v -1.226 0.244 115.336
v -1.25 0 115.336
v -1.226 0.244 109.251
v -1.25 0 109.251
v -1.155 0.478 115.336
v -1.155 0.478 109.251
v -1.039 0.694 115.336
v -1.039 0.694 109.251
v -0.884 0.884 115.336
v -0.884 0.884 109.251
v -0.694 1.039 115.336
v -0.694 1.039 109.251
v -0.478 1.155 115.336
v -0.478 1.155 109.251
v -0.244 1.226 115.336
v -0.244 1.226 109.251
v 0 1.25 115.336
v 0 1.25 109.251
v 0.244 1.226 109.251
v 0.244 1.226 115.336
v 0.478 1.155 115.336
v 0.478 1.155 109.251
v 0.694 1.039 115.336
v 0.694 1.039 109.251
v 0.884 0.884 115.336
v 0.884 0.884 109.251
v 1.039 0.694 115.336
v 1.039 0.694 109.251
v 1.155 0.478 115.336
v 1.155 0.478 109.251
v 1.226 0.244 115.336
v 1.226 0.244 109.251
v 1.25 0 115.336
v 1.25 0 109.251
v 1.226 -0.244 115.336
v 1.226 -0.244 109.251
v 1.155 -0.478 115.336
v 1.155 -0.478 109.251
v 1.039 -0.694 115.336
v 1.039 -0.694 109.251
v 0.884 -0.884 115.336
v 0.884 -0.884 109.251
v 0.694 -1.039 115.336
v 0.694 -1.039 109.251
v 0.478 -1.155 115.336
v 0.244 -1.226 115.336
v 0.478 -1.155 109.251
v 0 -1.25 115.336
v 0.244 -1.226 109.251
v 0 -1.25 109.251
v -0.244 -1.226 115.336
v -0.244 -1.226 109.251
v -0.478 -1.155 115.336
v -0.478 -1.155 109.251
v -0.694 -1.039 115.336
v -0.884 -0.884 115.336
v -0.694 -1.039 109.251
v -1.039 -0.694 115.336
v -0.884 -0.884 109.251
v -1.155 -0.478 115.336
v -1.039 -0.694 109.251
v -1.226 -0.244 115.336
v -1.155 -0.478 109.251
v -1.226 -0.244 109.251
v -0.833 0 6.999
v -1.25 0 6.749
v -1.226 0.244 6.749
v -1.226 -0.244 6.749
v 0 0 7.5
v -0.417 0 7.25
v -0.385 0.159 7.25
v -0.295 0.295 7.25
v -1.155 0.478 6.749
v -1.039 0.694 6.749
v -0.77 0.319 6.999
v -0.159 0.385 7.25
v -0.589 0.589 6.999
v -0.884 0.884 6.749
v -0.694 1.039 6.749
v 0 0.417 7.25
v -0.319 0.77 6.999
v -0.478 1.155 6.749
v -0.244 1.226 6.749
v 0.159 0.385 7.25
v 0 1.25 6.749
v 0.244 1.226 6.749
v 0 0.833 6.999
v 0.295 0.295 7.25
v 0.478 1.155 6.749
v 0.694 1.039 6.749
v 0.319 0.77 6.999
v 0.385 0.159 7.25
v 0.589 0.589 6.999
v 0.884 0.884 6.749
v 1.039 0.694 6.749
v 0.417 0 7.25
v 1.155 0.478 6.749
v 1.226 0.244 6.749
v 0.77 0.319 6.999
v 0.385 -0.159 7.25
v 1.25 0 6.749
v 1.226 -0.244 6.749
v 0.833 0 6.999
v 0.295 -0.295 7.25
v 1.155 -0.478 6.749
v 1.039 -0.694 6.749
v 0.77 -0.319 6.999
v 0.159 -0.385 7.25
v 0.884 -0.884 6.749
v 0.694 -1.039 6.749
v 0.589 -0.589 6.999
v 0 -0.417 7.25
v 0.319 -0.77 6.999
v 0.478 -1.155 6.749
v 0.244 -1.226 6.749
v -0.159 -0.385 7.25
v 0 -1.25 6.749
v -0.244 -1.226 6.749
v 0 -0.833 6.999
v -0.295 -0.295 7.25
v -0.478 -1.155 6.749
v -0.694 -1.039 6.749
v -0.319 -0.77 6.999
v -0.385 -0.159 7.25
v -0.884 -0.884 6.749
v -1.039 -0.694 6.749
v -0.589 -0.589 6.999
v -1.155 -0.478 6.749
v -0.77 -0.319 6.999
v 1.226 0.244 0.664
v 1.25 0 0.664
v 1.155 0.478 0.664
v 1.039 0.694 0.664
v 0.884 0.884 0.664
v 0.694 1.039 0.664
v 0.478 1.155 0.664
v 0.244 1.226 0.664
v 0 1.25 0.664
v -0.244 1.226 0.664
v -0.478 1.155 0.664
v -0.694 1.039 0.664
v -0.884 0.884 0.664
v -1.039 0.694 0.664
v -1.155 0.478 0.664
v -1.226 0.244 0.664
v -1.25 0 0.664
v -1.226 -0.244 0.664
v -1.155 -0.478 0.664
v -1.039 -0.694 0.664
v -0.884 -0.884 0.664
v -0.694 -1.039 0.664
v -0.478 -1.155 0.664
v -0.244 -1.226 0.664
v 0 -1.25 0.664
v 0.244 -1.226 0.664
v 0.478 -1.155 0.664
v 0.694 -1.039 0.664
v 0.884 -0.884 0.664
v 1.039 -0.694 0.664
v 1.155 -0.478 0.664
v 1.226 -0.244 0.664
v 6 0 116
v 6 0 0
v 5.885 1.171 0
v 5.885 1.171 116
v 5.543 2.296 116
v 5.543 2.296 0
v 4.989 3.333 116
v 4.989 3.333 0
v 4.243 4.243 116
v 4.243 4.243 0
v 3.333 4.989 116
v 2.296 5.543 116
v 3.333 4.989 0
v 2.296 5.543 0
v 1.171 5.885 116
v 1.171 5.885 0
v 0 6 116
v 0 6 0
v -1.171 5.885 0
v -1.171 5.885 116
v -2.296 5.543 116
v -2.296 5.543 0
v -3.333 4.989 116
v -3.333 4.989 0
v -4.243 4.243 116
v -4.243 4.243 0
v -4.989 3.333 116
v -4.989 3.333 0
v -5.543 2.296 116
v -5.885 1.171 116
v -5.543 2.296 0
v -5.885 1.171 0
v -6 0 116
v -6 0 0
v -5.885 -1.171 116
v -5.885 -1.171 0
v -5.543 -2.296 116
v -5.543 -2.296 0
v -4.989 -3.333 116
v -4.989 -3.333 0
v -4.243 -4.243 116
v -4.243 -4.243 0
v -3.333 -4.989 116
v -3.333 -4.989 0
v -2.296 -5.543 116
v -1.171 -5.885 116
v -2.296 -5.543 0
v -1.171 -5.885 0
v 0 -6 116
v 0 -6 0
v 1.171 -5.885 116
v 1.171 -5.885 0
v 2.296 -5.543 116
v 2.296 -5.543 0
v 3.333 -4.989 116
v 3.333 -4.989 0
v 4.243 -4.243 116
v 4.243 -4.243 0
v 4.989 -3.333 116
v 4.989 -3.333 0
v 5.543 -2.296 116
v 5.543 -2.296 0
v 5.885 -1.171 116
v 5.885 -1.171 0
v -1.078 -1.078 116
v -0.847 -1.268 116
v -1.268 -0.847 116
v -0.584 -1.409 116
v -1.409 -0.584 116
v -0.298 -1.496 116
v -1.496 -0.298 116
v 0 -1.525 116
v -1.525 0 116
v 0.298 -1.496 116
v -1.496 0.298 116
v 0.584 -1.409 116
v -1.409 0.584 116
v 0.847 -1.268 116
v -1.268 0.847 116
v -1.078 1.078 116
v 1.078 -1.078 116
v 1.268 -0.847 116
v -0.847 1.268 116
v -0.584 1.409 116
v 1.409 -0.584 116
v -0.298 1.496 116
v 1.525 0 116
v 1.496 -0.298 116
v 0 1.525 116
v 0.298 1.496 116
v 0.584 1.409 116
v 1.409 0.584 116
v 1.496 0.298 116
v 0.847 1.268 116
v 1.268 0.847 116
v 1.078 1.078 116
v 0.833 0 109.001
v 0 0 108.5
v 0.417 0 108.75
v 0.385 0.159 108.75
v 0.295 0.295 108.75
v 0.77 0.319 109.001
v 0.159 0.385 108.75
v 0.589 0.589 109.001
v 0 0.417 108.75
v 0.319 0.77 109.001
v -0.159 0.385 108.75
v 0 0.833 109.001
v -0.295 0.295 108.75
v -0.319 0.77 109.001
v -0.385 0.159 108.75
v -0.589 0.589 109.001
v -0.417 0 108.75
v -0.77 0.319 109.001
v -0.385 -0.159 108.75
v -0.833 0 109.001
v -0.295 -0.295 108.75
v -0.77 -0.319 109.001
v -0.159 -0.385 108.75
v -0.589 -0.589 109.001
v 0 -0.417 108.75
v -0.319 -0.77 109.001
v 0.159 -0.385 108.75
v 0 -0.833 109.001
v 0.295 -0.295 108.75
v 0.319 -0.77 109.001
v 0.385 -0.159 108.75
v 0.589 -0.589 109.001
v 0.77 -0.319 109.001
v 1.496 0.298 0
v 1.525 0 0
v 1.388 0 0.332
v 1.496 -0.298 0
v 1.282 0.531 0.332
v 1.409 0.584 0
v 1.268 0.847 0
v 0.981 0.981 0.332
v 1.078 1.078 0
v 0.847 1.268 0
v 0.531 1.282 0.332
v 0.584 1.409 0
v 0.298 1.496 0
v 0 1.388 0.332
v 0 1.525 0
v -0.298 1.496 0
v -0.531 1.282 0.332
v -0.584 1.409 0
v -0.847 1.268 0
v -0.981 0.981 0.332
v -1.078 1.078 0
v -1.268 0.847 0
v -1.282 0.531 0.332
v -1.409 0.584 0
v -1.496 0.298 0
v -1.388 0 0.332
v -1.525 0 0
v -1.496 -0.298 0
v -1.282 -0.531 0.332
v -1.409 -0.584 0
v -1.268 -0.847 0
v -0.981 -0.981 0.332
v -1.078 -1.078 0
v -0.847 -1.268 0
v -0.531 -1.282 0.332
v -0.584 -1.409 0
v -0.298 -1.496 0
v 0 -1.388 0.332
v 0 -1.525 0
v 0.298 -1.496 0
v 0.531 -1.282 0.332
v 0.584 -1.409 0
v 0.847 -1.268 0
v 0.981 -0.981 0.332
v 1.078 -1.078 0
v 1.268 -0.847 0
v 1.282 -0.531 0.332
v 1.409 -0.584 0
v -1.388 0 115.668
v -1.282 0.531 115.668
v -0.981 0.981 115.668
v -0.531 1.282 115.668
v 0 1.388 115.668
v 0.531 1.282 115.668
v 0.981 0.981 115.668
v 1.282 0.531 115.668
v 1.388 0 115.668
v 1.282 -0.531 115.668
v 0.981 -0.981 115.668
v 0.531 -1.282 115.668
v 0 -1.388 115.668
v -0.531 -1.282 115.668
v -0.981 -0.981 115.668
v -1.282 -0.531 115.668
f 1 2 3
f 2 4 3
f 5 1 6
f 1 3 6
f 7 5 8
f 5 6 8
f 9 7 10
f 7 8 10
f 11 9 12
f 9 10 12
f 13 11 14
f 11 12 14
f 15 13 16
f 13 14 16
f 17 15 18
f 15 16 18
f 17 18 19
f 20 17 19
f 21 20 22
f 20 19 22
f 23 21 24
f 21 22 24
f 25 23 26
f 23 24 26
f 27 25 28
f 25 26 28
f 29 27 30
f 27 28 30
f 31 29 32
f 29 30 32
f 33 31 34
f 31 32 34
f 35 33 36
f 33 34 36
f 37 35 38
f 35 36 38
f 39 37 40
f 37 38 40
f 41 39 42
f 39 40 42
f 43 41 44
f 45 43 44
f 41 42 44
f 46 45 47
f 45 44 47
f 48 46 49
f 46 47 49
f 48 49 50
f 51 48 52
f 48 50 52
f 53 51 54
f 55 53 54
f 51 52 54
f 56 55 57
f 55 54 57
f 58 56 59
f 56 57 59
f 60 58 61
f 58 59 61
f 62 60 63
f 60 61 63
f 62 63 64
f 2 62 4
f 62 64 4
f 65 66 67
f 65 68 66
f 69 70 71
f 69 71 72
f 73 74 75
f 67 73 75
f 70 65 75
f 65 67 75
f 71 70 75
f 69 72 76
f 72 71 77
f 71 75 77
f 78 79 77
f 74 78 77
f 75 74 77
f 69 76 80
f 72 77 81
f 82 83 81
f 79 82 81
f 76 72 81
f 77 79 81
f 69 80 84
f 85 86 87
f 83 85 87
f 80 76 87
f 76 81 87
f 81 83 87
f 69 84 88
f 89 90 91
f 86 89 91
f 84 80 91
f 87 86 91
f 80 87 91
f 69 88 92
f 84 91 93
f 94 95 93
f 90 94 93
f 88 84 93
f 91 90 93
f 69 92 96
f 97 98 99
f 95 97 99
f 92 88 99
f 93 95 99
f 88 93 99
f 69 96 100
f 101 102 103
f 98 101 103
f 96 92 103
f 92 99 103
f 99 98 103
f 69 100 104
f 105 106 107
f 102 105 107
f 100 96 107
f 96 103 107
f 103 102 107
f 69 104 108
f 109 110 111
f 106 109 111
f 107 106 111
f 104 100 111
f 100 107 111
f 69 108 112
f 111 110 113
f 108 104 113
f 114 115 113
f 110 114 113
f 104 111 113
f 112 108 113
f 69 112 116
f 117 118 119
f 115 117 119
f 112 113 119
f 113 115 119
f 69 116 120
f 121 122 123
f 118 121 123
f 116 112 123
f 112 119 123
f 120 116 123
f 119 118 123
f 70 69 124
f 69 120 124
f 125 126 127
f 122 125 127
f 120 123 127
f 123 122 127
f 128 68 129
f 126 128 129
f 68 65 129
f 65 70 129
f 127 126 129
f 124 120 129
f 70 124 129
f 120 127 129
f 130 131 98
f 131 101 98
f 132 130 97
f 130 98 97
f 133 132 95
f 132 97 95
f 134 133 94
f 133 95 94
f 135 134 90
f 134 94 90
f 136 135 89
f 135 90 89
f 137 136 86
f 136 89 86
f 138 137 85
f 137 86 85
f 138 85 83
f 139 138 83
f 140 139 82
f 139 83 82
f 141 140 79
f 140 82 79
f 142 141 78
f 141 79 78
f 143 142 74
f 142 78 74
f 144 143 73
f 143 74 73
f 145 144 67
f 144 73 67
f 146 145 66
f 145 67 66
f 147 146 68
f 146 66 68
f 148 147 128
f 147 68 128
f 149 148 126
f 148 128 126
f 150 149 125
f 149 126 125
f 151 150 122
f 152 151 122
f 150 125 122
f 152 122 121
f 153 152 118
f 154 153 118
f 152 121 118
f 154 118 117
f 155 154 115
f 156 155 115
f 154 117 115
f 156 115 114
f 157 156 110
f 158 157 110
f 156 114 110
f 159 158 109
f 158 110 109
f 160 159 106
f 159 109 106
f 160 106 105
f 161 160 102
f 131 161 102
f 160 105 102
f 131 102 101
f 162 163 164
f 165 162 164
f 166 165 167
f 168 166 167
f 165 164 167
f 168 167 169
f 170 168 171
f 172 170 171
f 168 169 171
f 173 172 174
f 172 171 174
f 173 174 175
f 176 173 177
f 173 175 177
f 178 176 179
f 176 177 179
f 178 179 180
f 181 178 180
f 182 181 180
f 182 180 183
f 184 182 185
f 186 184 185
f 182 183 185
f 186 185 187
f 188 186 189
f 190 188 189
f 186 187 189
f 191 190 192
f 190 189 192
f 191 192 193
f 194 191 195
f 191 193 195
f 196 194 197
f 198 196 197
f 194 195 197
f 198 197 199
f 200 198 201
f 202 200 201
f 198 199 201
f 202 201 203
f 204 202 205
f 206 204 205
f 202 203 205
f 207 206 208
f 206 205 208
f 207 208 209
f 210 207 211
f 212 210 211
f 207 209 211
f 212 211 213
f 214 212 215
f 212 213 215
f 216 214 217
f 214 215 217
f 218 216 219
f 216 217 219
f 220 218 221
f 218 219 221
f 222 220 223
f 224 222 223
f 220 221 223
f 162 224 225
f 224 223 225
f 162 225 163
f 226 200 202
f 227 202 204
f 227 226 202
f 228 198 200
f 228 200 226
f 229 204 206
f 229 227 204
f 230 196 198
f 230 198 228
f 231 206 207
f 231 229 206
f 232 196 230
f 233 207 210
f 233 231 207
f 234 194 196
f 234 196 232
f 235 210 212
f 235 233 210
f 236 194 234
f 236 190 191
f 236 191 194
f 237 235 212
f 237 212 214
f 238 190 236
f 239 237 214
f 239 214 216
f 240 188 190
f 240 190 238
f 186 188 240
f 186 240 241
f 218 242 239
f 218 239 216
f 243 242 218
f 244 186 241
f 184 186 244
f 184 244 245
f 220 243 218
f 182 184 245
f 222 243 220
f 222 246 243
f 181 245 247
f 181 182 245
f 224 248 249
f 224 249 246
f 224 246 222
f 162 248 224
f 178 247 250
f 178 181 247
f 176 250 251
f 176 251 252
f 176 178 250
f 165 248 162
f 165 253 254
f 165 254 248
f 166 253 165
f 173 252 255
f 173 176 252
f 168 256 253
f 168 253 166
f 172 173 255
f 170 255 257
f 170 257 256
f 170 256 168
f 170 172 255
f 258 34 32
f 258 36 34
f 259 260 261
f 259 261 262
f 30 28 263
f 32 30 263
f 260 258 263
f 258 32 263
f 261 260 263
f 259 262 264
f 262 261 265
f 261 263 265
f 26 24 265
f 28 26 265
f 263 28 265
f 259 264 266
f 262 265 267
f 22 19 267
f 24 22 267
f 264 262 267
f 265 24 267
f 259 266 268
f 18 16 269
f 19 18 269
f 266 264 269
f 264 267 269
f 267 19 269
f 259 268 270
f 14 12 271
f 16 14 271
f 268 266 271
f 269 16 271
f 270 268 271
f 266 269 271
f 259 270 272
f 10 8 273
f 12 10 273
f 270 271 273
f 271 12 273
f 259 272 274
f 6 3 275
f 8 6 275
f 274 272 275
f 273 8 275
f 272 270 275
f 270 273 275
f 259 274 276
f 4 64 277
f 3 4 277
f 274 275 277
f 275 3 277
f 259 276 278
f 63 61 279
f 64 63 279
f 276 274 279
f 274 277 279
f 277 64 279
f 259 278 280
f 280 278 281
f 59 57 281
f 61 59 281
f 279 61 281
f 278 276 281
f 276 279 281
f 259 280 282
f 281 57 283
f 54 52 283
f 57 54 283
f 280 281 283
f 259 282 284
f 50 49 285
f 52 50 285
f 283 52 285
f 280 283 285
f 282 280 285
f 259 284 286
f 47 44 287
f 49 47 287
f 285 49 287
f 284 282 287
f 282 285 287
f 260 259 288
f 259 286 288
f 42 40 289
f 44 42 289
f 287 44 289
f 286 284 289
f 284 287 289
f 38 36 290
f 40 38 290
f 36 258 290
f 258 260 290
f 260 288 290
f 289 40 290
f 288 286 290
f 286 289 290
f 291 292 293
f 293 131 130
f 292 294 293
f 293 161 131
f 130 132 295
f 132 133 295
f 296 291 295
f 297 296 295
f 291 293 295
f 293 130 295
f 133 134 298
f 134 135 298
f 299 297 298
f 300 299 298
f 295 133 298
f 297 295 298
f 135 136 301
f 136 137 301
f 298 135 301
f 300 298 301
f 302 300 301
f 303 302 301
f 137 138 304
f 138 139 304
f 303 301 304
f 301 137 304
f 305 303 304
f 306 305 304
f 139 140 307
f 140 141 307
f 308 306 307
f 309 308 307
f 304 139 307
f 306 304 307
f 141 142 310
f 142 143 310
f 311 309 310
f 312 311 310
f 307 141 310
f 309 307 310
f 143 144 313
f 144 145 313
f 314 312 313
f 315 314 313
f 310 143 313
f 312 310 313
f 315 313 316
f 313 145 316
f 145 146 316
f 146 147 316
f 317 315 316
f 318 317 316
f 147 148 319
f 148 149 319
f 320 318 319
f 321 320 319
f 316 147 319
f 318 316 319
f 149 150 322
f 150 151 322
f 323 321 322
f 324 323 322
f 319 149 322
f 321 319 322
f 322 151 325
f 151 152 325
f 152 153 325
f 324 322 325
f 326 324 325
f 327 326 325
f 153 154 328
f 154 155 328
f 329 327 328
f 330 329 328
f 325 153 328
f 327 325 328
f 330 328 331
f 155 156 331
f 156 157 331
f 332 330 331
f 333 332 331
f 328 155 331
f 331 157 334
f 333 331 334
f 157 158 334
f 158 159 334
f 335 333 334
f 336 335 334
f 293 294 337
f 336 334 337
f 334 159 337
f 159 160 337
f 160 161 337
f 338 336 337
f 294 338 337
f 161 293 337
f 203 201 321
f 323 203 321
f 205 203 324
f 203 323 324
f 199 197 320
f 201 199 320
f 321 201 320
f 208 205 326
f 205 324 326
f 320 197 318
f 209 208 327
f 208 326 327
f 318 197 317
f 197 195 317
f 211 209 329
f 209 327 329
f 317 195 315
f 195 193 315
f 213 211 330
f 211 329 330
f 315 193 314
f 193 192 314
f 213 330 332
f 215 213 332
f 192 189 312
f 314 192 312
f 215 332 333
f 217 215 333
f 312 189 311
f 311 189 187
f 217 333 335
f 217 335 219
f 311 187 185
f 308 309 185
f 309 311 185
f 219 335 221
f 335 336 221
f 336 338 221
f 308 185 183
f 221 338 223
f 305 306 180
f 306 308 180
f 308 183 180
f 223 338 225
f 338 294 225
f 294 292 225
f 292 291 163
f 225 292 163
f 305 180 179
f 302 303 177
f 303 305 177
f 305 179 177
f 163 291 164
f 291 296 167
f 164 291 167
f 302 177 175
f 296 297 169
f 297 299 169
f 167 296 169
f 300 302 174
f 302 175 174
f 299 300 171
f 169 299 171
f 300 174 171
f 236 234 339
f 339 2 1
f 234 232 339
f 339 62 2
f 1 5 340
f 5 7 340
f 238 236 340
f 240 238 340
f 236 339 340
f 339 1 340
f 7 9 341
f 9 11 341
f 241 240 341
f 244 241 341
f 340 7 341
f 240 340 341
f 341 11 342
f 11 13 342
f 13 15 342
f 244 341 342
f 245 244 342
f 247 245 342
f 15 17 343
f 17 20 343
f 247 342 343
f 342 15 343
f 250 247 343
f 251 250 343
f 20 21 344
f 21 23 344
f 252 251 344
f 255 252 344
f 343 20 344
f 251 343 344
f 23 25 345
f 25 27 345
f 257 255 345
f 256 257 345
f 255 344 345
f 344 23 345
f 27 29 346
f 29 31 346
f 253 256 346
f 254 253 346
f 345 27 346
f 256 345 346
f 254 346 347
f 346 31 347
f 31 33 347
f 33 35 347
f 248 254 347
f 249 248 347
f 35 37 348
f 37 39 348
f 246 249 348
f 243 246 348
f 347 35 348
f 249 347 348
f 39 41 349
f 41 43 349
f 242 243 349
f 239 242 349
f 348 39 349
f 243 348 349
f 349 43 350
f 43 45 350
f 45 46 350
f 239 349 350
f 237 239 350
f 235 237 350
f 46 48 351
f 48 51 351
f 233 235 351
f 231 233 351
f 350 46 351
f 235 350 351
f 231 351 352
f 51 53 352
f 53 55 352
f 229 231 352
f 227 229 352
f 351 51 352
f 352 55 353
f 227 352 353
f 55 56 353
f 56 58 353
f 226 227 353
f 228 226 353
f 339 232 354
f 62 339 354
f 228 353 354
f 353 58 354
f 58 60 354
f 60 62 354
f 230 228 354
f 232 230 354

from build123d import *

# Parameters (mm, degrees)
SKETCH_1_R                   = 6
EXTRUDE_1_DEPTH              = 116
HOLE_WIZARD_M3_3_D           = 2.5
HOLE_WIZARD_M3_3_DEPTH       = 6.748924226
HOLE_WIZARD_M3_3_CSINK_D     = 3.05
HOLE_WIZARD_M3_3_CSINK_ANGLE = 45
HOLE_WIZARD_M3_3_TIP         = 0.751075774
HOLE_WIZARD_M3_4_D           = 2.5
HOLE_WIZARD_M3_4_DEPTH       = 6.748924226
HOLE_WIZARD_M3_4_CSINK_D     = 3.05
HOLE_WIZARD_M3_4_CSINK_ANGLE = 45
HOLE_WIZARD_M3_4_TIP         = 0.751075774


with BuildPart() as part:
    # 草圖1 → 填料-伸長1 (new body)
    with BuildSketch(Plane.XY):
        Circle(SKETCH_1_R)
    extrude(amount=EXTRUDE_1_DEPTH)

    # M3 螺紋孔3
    with Locations(Plane.XY.offset(116)):
        with Locations((0, 0)):
            CounterSinkHole(HOLE_WIZARD_M3_3_D / 2, HOLE_WIZARD_M3_3_CSINK_D / 2, depth=HOLE_WIZARD_M3_3_DEPTH, counter_sink_angle=HOLE_WIZARD_M3_3_CSINK_ANGLE)
            with Locations((0, 0, -(HOLE_WIZARD_M3_3_DEPTH + HOLE_WIZARD_M3_3_TIP / 2))):  # 118° drill point
                Cone(0, HOLE_WIZARD_M3_3_D / 2, HOLE_WIZARD_M3_3_TIP, mode=Mode.SUBTRACT)

    # M3 螺紋孔4
    with Locations(Plane(origin=(0, 0, 0), x_dir=(-1, 0, 0), z_dir=(0, 0, -1))):
        with Locations((0, 0)):
            CounterSinkHole(HOLE_WIZARD_M3_4_D / 2, HOLE_WIZARD_M3_4_CSINK_D / 2, depth=HOLE_WIZARD_M3_4_DEPTH, counter_sink_angle=HOLE_WIZARD_M3_4_CSINK_ANGLE)
            with Locations((0, 0, -(HOLE_WIZARD_M3_4_DEPTH + HOLE_WIZARD_M3_4_TIP / 2))):  # 118° drill point
                Cone(0, HOLE_WIZARD_M3_4_D / 2, HOLE_WIZARD_M3_4_TIP, mode=Mode.SUBTRACT)


solid = part.part
